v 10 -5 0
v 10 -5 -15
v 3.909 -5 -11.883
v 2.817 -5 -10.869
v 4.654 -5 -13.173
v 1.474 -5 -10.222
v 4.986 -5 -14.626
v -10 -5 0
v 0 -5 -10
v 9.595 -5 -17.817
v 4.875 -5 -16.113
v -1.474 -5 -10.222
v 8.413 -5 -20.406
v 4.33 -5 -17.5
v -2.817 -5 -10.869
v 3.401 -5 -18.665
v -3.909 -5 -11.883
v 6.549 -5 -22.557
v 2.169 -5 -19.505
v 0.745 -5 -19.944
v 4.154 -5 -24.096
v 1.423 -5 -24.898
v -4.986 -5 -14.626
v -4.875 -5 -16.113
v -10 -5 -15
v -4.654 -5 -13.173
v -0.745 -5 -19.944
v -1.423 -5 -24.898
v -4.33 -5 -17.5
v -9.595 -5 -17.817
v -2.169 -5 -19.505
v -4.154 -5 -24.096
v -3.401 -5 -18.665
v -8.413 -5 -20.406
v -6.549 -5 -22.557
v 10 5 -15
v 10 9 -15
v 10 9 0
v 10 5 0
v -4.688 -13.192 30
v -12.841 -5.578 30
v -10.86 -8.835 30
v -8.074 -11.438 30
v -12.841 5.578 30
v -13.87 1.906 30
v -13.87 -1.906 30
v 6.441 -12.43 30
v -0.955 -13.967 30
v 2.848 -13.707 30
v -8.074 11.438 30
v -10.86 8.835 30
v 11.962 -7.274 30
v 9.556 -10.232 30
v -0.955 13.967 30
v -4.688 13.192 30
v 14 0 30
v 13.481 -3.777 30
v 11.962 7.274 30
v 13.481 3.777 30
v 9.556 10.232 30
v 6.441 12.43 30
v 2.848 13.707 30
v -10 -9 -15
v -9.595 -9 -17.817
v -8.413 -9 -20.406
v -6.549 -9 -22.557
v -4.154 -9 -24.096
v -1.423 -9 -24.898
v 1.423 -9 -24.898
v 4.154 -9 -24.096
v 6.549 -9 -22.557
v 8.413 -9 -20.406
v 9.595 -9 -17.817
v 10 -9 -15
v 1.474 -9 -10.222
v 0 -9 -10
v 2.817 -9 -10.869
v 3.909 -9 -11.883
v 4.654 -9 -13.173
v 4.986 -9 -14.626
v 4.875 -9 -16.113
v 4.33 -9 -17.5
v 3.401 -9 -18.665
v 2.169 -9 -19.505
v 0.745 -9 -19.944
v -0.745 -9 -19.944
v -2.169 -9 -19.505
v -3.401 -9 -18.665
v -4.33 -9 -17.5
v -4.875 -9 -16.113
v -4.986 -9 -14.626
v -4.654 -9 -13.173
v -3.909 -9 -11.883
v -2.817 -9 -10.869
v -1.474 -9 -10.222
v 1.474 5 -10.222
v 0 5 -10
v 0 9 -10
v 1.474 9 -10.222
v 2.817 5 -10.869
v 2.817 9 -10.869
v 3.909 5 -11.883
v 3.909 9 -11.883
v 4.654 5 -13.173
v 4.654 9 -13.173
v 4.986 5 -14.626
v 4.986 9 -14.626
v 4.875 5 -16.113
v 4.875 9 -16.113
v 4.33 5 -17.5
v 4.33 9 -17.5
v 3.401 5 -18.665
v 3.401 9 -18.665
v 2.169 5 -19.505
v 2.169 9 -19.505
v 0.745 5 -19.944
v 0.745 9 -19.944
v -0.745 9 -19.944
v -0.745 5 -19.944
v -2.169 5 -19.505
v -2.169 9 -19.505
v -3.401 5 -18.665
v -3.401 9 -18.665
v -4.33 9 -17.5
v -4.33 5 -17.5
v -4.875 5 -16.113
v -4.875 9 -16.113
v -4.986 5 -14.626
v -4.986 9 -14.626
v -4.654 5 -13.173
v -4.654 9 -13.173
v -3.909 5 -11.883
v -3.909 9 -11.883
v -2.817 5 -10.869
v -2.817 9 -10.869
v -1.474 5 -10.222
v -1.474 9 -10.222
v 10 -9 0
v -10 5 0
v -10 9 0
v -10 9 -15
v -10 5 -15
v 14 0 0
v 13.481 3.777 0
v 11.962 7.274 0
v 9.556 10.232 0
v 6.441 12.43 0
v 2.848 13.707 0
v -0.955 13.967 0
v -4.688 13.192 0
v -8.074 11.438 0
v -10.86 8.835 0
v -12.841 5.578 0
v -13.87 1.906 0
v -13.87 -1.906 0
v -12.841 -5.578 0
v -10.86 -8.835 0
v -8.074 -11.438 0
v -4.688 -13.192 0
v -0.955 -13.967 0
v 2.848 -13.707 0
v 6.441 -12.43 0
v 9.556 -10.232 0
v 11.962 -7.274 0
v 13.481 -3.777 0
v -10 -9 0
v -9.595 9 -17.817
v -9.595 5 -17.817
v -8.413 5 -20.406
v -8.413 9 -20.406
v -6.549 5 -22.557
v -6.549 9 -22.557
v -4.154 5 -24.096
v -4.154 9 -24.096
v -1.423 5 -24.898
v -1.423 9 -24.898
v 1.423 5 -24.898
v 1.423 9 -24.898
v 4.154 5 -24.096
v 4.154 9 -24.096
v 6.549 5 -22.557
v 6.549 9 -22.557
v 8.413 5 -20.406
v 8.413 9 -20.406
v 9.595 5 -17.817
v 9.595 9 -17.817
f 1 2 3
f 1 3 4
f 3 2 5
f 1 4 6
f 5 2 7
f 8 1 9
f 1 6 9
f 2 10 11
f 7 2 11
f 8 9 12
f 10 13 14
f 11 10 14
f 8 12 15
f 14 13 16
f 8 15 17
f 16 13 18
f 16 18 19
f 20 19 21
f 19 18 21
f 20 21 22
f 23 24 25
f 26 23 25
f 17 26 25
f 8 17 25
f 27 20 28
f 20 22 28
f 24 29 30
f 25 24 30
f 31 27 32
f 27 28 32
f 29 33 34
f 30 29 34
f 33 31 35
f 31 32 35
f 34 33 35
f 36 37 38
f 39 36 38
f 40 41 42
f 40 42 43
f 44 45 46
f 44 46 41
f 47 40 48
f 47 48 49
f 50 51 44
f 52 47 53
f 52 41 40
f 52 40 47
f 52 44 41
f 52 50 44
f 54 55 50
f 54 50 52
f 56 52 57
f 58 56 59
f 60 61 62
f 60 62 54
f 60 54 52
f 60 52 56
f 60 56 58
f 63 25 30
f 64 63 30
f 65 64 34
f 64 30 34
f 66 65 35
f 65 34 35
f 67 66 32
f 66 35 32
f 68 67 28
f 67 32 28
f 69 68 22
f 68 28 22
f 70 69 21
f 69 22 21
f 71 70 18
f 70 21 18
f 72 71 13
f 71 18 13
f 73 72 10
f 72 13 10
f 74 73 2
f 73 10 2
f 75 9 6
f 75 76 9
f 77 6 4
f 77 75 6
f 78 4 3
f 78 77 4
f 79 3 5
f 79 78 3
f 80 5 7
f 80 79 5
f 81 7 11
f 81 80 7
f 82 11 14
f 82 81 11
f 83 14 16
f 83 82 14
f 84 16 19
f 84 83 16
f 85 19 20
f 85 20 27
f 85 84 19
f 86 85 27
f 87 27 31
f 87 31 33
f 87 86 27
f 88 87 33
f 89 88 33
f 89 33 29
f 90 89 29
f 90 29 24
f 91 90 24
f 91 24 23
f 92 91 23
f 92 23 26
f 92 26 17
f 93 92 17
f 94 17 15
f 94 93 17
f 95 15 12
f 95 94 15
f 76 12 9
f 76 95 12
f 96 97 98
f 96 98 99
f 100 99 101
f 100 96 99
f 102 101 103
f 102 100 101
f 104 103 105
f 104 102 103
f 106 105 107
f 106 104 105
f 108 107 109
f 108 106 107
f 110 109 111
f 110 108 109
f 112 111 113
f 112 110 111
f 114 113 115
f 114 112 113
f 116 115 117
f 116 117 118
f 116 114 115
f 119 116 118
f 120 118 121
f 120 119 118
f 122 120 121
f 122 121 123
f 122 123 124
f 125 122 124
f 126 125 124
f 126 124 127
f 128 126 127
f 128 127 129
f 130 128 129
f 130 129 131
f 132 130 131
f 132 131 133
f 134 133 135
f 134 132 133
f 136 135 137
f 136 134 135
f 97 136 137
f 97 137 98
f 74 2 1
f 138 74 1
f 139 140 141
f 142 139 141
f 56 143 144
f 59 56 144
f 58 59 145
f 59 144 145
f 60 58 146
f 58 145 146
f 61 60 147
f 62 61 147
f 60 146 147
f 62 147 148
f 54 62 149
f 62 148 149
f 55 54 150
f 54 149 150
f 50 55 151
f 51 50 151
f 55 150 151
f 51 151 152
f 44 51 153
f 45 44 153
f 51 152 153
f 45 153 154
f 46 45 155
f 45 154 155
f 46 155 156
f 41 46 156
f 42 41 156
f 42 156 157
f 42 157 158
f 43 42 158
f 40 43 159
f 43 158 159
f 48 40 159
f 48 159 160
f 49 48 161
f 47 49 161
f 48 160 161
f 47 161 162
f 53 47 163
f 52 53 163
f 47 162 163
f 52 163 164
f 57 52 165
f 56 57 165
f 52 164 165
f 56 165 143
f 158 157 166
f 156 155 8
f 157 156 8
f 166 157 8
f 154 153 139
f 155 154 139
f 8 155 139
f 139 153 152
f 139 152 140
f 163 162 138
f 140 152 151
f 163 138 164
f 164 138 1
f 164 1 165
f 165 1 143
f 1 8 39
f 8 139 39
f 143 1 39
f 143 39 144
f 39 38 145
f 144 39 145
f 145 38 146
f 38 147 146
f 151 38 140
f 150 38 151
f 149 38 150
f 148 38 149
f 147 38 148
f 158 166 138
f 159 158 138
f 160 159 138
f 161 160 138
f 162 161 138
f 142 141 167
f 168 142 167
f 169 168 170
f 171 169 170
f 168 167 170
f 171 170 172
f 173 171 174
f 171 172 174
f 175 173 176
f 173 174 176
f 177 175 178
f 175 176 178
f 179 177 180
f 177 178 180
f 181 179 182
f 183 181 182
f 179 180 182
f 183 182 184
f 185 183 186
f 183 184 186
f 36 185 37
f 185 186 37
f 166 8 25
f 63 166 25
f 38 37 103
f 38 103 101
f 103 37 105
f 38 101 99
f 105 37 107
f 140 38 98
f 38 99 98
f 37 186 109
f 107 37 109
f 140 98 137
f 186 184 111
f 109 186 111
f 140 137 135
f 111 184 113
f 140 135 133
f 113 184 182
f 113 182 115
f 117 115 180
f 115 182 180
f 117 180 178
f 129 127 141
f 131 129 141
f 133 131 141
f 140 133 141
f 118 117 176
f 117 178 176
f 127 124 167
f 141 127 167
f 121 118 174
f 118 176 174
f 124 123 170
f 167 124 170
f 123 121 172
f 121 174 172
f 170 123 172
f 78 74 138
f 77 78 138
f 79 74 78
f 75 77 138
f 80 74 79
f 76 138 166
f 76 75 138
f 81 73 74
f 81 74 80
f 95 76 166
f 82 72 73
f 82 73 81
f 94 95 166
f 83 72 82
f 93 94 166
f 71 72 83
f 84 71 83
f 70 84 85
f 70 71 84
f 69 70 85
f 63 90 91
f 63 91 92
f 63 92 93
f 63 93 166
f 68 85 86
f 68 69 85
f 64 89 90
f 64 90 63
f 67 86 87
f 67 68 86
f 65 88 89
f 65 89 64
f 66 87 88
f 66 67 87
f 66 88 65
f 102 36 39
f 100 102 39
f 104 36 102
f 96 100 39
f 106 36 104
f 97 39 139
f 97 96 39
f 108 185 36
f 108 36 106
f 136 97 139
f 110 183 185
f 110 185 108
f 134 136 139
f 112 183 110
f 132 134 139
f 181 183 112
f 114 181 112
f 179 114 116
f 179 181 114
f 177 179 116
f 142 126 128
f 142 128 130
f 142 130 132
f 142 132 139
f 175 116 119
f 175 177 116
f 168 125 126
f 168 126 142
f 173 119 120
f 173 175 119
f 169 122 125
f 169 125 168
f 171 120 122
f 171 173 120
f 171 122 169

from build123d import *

# Parameters (mm, degrees)
SKETCH_1_R          = 14
EXTRUDE_1_DEPTH     = 30
SKETCH_2_R          = 5
EXTRUDE_2_DEPTH     = 9
SKETCH_2_3_R        = 5
CUT_EXTRUDE_1_DEPTH = 5


with BuildPart() as part:
    # 草图1 → 凸台-拉伸1 (new body)
    with BuildSketch(Plane.XY):
        Circle(SKETCH_1_R)
    extrude(amount=EXTRUDE_1_DEPTH)

    # 草图2 → 凸台-拉伸2 (add, symmetric)
    with BuildSketch(Plane(origin=(0, 0, 0), x_dir=(1, 0, 0), z_dir=(0, 1, 0))):
        with BuildLine():
            Line((10, 15), (10, 0))
            Line((10, 0), (-10, 0))
            Line((-10, 0), (-10, 15))
            ThreePointArc((-10, 15), (0, 25), (10, 15))
        make_face()
        with Locations((0, 15)):
            Circle(SKETCH_2_R, mode=Mode.SUBTRACT)
    extrude(amount=EXTRUDE_2_DEPTH, both=True)

    # 草图2<3> → 切除-拉伸1 (cut, symmetric)
    with BuildSketch(Plane(origin=(0, 0, 0), x_dir=(1, 0, 0), z_dir=(0, 1, 0))):
        with BuildLine():
            Line((10, 15), (10, 0))
            Line((10, 0), (-10, 0))
            Line((-10, 0), (-10, 15))
            ThreePointArc((-10, 15), (0, 25), (10, 15))
        make_face()
        with Locations((0, 15)):
            Circle(SKETCH_2_3_R, mode=Mode.SUBTRACT)
    extrude(amount=CUT_EXTRUDE_1_DEPTH, both=True, mode=Mode.SUBTRACT)


solid = part.part
